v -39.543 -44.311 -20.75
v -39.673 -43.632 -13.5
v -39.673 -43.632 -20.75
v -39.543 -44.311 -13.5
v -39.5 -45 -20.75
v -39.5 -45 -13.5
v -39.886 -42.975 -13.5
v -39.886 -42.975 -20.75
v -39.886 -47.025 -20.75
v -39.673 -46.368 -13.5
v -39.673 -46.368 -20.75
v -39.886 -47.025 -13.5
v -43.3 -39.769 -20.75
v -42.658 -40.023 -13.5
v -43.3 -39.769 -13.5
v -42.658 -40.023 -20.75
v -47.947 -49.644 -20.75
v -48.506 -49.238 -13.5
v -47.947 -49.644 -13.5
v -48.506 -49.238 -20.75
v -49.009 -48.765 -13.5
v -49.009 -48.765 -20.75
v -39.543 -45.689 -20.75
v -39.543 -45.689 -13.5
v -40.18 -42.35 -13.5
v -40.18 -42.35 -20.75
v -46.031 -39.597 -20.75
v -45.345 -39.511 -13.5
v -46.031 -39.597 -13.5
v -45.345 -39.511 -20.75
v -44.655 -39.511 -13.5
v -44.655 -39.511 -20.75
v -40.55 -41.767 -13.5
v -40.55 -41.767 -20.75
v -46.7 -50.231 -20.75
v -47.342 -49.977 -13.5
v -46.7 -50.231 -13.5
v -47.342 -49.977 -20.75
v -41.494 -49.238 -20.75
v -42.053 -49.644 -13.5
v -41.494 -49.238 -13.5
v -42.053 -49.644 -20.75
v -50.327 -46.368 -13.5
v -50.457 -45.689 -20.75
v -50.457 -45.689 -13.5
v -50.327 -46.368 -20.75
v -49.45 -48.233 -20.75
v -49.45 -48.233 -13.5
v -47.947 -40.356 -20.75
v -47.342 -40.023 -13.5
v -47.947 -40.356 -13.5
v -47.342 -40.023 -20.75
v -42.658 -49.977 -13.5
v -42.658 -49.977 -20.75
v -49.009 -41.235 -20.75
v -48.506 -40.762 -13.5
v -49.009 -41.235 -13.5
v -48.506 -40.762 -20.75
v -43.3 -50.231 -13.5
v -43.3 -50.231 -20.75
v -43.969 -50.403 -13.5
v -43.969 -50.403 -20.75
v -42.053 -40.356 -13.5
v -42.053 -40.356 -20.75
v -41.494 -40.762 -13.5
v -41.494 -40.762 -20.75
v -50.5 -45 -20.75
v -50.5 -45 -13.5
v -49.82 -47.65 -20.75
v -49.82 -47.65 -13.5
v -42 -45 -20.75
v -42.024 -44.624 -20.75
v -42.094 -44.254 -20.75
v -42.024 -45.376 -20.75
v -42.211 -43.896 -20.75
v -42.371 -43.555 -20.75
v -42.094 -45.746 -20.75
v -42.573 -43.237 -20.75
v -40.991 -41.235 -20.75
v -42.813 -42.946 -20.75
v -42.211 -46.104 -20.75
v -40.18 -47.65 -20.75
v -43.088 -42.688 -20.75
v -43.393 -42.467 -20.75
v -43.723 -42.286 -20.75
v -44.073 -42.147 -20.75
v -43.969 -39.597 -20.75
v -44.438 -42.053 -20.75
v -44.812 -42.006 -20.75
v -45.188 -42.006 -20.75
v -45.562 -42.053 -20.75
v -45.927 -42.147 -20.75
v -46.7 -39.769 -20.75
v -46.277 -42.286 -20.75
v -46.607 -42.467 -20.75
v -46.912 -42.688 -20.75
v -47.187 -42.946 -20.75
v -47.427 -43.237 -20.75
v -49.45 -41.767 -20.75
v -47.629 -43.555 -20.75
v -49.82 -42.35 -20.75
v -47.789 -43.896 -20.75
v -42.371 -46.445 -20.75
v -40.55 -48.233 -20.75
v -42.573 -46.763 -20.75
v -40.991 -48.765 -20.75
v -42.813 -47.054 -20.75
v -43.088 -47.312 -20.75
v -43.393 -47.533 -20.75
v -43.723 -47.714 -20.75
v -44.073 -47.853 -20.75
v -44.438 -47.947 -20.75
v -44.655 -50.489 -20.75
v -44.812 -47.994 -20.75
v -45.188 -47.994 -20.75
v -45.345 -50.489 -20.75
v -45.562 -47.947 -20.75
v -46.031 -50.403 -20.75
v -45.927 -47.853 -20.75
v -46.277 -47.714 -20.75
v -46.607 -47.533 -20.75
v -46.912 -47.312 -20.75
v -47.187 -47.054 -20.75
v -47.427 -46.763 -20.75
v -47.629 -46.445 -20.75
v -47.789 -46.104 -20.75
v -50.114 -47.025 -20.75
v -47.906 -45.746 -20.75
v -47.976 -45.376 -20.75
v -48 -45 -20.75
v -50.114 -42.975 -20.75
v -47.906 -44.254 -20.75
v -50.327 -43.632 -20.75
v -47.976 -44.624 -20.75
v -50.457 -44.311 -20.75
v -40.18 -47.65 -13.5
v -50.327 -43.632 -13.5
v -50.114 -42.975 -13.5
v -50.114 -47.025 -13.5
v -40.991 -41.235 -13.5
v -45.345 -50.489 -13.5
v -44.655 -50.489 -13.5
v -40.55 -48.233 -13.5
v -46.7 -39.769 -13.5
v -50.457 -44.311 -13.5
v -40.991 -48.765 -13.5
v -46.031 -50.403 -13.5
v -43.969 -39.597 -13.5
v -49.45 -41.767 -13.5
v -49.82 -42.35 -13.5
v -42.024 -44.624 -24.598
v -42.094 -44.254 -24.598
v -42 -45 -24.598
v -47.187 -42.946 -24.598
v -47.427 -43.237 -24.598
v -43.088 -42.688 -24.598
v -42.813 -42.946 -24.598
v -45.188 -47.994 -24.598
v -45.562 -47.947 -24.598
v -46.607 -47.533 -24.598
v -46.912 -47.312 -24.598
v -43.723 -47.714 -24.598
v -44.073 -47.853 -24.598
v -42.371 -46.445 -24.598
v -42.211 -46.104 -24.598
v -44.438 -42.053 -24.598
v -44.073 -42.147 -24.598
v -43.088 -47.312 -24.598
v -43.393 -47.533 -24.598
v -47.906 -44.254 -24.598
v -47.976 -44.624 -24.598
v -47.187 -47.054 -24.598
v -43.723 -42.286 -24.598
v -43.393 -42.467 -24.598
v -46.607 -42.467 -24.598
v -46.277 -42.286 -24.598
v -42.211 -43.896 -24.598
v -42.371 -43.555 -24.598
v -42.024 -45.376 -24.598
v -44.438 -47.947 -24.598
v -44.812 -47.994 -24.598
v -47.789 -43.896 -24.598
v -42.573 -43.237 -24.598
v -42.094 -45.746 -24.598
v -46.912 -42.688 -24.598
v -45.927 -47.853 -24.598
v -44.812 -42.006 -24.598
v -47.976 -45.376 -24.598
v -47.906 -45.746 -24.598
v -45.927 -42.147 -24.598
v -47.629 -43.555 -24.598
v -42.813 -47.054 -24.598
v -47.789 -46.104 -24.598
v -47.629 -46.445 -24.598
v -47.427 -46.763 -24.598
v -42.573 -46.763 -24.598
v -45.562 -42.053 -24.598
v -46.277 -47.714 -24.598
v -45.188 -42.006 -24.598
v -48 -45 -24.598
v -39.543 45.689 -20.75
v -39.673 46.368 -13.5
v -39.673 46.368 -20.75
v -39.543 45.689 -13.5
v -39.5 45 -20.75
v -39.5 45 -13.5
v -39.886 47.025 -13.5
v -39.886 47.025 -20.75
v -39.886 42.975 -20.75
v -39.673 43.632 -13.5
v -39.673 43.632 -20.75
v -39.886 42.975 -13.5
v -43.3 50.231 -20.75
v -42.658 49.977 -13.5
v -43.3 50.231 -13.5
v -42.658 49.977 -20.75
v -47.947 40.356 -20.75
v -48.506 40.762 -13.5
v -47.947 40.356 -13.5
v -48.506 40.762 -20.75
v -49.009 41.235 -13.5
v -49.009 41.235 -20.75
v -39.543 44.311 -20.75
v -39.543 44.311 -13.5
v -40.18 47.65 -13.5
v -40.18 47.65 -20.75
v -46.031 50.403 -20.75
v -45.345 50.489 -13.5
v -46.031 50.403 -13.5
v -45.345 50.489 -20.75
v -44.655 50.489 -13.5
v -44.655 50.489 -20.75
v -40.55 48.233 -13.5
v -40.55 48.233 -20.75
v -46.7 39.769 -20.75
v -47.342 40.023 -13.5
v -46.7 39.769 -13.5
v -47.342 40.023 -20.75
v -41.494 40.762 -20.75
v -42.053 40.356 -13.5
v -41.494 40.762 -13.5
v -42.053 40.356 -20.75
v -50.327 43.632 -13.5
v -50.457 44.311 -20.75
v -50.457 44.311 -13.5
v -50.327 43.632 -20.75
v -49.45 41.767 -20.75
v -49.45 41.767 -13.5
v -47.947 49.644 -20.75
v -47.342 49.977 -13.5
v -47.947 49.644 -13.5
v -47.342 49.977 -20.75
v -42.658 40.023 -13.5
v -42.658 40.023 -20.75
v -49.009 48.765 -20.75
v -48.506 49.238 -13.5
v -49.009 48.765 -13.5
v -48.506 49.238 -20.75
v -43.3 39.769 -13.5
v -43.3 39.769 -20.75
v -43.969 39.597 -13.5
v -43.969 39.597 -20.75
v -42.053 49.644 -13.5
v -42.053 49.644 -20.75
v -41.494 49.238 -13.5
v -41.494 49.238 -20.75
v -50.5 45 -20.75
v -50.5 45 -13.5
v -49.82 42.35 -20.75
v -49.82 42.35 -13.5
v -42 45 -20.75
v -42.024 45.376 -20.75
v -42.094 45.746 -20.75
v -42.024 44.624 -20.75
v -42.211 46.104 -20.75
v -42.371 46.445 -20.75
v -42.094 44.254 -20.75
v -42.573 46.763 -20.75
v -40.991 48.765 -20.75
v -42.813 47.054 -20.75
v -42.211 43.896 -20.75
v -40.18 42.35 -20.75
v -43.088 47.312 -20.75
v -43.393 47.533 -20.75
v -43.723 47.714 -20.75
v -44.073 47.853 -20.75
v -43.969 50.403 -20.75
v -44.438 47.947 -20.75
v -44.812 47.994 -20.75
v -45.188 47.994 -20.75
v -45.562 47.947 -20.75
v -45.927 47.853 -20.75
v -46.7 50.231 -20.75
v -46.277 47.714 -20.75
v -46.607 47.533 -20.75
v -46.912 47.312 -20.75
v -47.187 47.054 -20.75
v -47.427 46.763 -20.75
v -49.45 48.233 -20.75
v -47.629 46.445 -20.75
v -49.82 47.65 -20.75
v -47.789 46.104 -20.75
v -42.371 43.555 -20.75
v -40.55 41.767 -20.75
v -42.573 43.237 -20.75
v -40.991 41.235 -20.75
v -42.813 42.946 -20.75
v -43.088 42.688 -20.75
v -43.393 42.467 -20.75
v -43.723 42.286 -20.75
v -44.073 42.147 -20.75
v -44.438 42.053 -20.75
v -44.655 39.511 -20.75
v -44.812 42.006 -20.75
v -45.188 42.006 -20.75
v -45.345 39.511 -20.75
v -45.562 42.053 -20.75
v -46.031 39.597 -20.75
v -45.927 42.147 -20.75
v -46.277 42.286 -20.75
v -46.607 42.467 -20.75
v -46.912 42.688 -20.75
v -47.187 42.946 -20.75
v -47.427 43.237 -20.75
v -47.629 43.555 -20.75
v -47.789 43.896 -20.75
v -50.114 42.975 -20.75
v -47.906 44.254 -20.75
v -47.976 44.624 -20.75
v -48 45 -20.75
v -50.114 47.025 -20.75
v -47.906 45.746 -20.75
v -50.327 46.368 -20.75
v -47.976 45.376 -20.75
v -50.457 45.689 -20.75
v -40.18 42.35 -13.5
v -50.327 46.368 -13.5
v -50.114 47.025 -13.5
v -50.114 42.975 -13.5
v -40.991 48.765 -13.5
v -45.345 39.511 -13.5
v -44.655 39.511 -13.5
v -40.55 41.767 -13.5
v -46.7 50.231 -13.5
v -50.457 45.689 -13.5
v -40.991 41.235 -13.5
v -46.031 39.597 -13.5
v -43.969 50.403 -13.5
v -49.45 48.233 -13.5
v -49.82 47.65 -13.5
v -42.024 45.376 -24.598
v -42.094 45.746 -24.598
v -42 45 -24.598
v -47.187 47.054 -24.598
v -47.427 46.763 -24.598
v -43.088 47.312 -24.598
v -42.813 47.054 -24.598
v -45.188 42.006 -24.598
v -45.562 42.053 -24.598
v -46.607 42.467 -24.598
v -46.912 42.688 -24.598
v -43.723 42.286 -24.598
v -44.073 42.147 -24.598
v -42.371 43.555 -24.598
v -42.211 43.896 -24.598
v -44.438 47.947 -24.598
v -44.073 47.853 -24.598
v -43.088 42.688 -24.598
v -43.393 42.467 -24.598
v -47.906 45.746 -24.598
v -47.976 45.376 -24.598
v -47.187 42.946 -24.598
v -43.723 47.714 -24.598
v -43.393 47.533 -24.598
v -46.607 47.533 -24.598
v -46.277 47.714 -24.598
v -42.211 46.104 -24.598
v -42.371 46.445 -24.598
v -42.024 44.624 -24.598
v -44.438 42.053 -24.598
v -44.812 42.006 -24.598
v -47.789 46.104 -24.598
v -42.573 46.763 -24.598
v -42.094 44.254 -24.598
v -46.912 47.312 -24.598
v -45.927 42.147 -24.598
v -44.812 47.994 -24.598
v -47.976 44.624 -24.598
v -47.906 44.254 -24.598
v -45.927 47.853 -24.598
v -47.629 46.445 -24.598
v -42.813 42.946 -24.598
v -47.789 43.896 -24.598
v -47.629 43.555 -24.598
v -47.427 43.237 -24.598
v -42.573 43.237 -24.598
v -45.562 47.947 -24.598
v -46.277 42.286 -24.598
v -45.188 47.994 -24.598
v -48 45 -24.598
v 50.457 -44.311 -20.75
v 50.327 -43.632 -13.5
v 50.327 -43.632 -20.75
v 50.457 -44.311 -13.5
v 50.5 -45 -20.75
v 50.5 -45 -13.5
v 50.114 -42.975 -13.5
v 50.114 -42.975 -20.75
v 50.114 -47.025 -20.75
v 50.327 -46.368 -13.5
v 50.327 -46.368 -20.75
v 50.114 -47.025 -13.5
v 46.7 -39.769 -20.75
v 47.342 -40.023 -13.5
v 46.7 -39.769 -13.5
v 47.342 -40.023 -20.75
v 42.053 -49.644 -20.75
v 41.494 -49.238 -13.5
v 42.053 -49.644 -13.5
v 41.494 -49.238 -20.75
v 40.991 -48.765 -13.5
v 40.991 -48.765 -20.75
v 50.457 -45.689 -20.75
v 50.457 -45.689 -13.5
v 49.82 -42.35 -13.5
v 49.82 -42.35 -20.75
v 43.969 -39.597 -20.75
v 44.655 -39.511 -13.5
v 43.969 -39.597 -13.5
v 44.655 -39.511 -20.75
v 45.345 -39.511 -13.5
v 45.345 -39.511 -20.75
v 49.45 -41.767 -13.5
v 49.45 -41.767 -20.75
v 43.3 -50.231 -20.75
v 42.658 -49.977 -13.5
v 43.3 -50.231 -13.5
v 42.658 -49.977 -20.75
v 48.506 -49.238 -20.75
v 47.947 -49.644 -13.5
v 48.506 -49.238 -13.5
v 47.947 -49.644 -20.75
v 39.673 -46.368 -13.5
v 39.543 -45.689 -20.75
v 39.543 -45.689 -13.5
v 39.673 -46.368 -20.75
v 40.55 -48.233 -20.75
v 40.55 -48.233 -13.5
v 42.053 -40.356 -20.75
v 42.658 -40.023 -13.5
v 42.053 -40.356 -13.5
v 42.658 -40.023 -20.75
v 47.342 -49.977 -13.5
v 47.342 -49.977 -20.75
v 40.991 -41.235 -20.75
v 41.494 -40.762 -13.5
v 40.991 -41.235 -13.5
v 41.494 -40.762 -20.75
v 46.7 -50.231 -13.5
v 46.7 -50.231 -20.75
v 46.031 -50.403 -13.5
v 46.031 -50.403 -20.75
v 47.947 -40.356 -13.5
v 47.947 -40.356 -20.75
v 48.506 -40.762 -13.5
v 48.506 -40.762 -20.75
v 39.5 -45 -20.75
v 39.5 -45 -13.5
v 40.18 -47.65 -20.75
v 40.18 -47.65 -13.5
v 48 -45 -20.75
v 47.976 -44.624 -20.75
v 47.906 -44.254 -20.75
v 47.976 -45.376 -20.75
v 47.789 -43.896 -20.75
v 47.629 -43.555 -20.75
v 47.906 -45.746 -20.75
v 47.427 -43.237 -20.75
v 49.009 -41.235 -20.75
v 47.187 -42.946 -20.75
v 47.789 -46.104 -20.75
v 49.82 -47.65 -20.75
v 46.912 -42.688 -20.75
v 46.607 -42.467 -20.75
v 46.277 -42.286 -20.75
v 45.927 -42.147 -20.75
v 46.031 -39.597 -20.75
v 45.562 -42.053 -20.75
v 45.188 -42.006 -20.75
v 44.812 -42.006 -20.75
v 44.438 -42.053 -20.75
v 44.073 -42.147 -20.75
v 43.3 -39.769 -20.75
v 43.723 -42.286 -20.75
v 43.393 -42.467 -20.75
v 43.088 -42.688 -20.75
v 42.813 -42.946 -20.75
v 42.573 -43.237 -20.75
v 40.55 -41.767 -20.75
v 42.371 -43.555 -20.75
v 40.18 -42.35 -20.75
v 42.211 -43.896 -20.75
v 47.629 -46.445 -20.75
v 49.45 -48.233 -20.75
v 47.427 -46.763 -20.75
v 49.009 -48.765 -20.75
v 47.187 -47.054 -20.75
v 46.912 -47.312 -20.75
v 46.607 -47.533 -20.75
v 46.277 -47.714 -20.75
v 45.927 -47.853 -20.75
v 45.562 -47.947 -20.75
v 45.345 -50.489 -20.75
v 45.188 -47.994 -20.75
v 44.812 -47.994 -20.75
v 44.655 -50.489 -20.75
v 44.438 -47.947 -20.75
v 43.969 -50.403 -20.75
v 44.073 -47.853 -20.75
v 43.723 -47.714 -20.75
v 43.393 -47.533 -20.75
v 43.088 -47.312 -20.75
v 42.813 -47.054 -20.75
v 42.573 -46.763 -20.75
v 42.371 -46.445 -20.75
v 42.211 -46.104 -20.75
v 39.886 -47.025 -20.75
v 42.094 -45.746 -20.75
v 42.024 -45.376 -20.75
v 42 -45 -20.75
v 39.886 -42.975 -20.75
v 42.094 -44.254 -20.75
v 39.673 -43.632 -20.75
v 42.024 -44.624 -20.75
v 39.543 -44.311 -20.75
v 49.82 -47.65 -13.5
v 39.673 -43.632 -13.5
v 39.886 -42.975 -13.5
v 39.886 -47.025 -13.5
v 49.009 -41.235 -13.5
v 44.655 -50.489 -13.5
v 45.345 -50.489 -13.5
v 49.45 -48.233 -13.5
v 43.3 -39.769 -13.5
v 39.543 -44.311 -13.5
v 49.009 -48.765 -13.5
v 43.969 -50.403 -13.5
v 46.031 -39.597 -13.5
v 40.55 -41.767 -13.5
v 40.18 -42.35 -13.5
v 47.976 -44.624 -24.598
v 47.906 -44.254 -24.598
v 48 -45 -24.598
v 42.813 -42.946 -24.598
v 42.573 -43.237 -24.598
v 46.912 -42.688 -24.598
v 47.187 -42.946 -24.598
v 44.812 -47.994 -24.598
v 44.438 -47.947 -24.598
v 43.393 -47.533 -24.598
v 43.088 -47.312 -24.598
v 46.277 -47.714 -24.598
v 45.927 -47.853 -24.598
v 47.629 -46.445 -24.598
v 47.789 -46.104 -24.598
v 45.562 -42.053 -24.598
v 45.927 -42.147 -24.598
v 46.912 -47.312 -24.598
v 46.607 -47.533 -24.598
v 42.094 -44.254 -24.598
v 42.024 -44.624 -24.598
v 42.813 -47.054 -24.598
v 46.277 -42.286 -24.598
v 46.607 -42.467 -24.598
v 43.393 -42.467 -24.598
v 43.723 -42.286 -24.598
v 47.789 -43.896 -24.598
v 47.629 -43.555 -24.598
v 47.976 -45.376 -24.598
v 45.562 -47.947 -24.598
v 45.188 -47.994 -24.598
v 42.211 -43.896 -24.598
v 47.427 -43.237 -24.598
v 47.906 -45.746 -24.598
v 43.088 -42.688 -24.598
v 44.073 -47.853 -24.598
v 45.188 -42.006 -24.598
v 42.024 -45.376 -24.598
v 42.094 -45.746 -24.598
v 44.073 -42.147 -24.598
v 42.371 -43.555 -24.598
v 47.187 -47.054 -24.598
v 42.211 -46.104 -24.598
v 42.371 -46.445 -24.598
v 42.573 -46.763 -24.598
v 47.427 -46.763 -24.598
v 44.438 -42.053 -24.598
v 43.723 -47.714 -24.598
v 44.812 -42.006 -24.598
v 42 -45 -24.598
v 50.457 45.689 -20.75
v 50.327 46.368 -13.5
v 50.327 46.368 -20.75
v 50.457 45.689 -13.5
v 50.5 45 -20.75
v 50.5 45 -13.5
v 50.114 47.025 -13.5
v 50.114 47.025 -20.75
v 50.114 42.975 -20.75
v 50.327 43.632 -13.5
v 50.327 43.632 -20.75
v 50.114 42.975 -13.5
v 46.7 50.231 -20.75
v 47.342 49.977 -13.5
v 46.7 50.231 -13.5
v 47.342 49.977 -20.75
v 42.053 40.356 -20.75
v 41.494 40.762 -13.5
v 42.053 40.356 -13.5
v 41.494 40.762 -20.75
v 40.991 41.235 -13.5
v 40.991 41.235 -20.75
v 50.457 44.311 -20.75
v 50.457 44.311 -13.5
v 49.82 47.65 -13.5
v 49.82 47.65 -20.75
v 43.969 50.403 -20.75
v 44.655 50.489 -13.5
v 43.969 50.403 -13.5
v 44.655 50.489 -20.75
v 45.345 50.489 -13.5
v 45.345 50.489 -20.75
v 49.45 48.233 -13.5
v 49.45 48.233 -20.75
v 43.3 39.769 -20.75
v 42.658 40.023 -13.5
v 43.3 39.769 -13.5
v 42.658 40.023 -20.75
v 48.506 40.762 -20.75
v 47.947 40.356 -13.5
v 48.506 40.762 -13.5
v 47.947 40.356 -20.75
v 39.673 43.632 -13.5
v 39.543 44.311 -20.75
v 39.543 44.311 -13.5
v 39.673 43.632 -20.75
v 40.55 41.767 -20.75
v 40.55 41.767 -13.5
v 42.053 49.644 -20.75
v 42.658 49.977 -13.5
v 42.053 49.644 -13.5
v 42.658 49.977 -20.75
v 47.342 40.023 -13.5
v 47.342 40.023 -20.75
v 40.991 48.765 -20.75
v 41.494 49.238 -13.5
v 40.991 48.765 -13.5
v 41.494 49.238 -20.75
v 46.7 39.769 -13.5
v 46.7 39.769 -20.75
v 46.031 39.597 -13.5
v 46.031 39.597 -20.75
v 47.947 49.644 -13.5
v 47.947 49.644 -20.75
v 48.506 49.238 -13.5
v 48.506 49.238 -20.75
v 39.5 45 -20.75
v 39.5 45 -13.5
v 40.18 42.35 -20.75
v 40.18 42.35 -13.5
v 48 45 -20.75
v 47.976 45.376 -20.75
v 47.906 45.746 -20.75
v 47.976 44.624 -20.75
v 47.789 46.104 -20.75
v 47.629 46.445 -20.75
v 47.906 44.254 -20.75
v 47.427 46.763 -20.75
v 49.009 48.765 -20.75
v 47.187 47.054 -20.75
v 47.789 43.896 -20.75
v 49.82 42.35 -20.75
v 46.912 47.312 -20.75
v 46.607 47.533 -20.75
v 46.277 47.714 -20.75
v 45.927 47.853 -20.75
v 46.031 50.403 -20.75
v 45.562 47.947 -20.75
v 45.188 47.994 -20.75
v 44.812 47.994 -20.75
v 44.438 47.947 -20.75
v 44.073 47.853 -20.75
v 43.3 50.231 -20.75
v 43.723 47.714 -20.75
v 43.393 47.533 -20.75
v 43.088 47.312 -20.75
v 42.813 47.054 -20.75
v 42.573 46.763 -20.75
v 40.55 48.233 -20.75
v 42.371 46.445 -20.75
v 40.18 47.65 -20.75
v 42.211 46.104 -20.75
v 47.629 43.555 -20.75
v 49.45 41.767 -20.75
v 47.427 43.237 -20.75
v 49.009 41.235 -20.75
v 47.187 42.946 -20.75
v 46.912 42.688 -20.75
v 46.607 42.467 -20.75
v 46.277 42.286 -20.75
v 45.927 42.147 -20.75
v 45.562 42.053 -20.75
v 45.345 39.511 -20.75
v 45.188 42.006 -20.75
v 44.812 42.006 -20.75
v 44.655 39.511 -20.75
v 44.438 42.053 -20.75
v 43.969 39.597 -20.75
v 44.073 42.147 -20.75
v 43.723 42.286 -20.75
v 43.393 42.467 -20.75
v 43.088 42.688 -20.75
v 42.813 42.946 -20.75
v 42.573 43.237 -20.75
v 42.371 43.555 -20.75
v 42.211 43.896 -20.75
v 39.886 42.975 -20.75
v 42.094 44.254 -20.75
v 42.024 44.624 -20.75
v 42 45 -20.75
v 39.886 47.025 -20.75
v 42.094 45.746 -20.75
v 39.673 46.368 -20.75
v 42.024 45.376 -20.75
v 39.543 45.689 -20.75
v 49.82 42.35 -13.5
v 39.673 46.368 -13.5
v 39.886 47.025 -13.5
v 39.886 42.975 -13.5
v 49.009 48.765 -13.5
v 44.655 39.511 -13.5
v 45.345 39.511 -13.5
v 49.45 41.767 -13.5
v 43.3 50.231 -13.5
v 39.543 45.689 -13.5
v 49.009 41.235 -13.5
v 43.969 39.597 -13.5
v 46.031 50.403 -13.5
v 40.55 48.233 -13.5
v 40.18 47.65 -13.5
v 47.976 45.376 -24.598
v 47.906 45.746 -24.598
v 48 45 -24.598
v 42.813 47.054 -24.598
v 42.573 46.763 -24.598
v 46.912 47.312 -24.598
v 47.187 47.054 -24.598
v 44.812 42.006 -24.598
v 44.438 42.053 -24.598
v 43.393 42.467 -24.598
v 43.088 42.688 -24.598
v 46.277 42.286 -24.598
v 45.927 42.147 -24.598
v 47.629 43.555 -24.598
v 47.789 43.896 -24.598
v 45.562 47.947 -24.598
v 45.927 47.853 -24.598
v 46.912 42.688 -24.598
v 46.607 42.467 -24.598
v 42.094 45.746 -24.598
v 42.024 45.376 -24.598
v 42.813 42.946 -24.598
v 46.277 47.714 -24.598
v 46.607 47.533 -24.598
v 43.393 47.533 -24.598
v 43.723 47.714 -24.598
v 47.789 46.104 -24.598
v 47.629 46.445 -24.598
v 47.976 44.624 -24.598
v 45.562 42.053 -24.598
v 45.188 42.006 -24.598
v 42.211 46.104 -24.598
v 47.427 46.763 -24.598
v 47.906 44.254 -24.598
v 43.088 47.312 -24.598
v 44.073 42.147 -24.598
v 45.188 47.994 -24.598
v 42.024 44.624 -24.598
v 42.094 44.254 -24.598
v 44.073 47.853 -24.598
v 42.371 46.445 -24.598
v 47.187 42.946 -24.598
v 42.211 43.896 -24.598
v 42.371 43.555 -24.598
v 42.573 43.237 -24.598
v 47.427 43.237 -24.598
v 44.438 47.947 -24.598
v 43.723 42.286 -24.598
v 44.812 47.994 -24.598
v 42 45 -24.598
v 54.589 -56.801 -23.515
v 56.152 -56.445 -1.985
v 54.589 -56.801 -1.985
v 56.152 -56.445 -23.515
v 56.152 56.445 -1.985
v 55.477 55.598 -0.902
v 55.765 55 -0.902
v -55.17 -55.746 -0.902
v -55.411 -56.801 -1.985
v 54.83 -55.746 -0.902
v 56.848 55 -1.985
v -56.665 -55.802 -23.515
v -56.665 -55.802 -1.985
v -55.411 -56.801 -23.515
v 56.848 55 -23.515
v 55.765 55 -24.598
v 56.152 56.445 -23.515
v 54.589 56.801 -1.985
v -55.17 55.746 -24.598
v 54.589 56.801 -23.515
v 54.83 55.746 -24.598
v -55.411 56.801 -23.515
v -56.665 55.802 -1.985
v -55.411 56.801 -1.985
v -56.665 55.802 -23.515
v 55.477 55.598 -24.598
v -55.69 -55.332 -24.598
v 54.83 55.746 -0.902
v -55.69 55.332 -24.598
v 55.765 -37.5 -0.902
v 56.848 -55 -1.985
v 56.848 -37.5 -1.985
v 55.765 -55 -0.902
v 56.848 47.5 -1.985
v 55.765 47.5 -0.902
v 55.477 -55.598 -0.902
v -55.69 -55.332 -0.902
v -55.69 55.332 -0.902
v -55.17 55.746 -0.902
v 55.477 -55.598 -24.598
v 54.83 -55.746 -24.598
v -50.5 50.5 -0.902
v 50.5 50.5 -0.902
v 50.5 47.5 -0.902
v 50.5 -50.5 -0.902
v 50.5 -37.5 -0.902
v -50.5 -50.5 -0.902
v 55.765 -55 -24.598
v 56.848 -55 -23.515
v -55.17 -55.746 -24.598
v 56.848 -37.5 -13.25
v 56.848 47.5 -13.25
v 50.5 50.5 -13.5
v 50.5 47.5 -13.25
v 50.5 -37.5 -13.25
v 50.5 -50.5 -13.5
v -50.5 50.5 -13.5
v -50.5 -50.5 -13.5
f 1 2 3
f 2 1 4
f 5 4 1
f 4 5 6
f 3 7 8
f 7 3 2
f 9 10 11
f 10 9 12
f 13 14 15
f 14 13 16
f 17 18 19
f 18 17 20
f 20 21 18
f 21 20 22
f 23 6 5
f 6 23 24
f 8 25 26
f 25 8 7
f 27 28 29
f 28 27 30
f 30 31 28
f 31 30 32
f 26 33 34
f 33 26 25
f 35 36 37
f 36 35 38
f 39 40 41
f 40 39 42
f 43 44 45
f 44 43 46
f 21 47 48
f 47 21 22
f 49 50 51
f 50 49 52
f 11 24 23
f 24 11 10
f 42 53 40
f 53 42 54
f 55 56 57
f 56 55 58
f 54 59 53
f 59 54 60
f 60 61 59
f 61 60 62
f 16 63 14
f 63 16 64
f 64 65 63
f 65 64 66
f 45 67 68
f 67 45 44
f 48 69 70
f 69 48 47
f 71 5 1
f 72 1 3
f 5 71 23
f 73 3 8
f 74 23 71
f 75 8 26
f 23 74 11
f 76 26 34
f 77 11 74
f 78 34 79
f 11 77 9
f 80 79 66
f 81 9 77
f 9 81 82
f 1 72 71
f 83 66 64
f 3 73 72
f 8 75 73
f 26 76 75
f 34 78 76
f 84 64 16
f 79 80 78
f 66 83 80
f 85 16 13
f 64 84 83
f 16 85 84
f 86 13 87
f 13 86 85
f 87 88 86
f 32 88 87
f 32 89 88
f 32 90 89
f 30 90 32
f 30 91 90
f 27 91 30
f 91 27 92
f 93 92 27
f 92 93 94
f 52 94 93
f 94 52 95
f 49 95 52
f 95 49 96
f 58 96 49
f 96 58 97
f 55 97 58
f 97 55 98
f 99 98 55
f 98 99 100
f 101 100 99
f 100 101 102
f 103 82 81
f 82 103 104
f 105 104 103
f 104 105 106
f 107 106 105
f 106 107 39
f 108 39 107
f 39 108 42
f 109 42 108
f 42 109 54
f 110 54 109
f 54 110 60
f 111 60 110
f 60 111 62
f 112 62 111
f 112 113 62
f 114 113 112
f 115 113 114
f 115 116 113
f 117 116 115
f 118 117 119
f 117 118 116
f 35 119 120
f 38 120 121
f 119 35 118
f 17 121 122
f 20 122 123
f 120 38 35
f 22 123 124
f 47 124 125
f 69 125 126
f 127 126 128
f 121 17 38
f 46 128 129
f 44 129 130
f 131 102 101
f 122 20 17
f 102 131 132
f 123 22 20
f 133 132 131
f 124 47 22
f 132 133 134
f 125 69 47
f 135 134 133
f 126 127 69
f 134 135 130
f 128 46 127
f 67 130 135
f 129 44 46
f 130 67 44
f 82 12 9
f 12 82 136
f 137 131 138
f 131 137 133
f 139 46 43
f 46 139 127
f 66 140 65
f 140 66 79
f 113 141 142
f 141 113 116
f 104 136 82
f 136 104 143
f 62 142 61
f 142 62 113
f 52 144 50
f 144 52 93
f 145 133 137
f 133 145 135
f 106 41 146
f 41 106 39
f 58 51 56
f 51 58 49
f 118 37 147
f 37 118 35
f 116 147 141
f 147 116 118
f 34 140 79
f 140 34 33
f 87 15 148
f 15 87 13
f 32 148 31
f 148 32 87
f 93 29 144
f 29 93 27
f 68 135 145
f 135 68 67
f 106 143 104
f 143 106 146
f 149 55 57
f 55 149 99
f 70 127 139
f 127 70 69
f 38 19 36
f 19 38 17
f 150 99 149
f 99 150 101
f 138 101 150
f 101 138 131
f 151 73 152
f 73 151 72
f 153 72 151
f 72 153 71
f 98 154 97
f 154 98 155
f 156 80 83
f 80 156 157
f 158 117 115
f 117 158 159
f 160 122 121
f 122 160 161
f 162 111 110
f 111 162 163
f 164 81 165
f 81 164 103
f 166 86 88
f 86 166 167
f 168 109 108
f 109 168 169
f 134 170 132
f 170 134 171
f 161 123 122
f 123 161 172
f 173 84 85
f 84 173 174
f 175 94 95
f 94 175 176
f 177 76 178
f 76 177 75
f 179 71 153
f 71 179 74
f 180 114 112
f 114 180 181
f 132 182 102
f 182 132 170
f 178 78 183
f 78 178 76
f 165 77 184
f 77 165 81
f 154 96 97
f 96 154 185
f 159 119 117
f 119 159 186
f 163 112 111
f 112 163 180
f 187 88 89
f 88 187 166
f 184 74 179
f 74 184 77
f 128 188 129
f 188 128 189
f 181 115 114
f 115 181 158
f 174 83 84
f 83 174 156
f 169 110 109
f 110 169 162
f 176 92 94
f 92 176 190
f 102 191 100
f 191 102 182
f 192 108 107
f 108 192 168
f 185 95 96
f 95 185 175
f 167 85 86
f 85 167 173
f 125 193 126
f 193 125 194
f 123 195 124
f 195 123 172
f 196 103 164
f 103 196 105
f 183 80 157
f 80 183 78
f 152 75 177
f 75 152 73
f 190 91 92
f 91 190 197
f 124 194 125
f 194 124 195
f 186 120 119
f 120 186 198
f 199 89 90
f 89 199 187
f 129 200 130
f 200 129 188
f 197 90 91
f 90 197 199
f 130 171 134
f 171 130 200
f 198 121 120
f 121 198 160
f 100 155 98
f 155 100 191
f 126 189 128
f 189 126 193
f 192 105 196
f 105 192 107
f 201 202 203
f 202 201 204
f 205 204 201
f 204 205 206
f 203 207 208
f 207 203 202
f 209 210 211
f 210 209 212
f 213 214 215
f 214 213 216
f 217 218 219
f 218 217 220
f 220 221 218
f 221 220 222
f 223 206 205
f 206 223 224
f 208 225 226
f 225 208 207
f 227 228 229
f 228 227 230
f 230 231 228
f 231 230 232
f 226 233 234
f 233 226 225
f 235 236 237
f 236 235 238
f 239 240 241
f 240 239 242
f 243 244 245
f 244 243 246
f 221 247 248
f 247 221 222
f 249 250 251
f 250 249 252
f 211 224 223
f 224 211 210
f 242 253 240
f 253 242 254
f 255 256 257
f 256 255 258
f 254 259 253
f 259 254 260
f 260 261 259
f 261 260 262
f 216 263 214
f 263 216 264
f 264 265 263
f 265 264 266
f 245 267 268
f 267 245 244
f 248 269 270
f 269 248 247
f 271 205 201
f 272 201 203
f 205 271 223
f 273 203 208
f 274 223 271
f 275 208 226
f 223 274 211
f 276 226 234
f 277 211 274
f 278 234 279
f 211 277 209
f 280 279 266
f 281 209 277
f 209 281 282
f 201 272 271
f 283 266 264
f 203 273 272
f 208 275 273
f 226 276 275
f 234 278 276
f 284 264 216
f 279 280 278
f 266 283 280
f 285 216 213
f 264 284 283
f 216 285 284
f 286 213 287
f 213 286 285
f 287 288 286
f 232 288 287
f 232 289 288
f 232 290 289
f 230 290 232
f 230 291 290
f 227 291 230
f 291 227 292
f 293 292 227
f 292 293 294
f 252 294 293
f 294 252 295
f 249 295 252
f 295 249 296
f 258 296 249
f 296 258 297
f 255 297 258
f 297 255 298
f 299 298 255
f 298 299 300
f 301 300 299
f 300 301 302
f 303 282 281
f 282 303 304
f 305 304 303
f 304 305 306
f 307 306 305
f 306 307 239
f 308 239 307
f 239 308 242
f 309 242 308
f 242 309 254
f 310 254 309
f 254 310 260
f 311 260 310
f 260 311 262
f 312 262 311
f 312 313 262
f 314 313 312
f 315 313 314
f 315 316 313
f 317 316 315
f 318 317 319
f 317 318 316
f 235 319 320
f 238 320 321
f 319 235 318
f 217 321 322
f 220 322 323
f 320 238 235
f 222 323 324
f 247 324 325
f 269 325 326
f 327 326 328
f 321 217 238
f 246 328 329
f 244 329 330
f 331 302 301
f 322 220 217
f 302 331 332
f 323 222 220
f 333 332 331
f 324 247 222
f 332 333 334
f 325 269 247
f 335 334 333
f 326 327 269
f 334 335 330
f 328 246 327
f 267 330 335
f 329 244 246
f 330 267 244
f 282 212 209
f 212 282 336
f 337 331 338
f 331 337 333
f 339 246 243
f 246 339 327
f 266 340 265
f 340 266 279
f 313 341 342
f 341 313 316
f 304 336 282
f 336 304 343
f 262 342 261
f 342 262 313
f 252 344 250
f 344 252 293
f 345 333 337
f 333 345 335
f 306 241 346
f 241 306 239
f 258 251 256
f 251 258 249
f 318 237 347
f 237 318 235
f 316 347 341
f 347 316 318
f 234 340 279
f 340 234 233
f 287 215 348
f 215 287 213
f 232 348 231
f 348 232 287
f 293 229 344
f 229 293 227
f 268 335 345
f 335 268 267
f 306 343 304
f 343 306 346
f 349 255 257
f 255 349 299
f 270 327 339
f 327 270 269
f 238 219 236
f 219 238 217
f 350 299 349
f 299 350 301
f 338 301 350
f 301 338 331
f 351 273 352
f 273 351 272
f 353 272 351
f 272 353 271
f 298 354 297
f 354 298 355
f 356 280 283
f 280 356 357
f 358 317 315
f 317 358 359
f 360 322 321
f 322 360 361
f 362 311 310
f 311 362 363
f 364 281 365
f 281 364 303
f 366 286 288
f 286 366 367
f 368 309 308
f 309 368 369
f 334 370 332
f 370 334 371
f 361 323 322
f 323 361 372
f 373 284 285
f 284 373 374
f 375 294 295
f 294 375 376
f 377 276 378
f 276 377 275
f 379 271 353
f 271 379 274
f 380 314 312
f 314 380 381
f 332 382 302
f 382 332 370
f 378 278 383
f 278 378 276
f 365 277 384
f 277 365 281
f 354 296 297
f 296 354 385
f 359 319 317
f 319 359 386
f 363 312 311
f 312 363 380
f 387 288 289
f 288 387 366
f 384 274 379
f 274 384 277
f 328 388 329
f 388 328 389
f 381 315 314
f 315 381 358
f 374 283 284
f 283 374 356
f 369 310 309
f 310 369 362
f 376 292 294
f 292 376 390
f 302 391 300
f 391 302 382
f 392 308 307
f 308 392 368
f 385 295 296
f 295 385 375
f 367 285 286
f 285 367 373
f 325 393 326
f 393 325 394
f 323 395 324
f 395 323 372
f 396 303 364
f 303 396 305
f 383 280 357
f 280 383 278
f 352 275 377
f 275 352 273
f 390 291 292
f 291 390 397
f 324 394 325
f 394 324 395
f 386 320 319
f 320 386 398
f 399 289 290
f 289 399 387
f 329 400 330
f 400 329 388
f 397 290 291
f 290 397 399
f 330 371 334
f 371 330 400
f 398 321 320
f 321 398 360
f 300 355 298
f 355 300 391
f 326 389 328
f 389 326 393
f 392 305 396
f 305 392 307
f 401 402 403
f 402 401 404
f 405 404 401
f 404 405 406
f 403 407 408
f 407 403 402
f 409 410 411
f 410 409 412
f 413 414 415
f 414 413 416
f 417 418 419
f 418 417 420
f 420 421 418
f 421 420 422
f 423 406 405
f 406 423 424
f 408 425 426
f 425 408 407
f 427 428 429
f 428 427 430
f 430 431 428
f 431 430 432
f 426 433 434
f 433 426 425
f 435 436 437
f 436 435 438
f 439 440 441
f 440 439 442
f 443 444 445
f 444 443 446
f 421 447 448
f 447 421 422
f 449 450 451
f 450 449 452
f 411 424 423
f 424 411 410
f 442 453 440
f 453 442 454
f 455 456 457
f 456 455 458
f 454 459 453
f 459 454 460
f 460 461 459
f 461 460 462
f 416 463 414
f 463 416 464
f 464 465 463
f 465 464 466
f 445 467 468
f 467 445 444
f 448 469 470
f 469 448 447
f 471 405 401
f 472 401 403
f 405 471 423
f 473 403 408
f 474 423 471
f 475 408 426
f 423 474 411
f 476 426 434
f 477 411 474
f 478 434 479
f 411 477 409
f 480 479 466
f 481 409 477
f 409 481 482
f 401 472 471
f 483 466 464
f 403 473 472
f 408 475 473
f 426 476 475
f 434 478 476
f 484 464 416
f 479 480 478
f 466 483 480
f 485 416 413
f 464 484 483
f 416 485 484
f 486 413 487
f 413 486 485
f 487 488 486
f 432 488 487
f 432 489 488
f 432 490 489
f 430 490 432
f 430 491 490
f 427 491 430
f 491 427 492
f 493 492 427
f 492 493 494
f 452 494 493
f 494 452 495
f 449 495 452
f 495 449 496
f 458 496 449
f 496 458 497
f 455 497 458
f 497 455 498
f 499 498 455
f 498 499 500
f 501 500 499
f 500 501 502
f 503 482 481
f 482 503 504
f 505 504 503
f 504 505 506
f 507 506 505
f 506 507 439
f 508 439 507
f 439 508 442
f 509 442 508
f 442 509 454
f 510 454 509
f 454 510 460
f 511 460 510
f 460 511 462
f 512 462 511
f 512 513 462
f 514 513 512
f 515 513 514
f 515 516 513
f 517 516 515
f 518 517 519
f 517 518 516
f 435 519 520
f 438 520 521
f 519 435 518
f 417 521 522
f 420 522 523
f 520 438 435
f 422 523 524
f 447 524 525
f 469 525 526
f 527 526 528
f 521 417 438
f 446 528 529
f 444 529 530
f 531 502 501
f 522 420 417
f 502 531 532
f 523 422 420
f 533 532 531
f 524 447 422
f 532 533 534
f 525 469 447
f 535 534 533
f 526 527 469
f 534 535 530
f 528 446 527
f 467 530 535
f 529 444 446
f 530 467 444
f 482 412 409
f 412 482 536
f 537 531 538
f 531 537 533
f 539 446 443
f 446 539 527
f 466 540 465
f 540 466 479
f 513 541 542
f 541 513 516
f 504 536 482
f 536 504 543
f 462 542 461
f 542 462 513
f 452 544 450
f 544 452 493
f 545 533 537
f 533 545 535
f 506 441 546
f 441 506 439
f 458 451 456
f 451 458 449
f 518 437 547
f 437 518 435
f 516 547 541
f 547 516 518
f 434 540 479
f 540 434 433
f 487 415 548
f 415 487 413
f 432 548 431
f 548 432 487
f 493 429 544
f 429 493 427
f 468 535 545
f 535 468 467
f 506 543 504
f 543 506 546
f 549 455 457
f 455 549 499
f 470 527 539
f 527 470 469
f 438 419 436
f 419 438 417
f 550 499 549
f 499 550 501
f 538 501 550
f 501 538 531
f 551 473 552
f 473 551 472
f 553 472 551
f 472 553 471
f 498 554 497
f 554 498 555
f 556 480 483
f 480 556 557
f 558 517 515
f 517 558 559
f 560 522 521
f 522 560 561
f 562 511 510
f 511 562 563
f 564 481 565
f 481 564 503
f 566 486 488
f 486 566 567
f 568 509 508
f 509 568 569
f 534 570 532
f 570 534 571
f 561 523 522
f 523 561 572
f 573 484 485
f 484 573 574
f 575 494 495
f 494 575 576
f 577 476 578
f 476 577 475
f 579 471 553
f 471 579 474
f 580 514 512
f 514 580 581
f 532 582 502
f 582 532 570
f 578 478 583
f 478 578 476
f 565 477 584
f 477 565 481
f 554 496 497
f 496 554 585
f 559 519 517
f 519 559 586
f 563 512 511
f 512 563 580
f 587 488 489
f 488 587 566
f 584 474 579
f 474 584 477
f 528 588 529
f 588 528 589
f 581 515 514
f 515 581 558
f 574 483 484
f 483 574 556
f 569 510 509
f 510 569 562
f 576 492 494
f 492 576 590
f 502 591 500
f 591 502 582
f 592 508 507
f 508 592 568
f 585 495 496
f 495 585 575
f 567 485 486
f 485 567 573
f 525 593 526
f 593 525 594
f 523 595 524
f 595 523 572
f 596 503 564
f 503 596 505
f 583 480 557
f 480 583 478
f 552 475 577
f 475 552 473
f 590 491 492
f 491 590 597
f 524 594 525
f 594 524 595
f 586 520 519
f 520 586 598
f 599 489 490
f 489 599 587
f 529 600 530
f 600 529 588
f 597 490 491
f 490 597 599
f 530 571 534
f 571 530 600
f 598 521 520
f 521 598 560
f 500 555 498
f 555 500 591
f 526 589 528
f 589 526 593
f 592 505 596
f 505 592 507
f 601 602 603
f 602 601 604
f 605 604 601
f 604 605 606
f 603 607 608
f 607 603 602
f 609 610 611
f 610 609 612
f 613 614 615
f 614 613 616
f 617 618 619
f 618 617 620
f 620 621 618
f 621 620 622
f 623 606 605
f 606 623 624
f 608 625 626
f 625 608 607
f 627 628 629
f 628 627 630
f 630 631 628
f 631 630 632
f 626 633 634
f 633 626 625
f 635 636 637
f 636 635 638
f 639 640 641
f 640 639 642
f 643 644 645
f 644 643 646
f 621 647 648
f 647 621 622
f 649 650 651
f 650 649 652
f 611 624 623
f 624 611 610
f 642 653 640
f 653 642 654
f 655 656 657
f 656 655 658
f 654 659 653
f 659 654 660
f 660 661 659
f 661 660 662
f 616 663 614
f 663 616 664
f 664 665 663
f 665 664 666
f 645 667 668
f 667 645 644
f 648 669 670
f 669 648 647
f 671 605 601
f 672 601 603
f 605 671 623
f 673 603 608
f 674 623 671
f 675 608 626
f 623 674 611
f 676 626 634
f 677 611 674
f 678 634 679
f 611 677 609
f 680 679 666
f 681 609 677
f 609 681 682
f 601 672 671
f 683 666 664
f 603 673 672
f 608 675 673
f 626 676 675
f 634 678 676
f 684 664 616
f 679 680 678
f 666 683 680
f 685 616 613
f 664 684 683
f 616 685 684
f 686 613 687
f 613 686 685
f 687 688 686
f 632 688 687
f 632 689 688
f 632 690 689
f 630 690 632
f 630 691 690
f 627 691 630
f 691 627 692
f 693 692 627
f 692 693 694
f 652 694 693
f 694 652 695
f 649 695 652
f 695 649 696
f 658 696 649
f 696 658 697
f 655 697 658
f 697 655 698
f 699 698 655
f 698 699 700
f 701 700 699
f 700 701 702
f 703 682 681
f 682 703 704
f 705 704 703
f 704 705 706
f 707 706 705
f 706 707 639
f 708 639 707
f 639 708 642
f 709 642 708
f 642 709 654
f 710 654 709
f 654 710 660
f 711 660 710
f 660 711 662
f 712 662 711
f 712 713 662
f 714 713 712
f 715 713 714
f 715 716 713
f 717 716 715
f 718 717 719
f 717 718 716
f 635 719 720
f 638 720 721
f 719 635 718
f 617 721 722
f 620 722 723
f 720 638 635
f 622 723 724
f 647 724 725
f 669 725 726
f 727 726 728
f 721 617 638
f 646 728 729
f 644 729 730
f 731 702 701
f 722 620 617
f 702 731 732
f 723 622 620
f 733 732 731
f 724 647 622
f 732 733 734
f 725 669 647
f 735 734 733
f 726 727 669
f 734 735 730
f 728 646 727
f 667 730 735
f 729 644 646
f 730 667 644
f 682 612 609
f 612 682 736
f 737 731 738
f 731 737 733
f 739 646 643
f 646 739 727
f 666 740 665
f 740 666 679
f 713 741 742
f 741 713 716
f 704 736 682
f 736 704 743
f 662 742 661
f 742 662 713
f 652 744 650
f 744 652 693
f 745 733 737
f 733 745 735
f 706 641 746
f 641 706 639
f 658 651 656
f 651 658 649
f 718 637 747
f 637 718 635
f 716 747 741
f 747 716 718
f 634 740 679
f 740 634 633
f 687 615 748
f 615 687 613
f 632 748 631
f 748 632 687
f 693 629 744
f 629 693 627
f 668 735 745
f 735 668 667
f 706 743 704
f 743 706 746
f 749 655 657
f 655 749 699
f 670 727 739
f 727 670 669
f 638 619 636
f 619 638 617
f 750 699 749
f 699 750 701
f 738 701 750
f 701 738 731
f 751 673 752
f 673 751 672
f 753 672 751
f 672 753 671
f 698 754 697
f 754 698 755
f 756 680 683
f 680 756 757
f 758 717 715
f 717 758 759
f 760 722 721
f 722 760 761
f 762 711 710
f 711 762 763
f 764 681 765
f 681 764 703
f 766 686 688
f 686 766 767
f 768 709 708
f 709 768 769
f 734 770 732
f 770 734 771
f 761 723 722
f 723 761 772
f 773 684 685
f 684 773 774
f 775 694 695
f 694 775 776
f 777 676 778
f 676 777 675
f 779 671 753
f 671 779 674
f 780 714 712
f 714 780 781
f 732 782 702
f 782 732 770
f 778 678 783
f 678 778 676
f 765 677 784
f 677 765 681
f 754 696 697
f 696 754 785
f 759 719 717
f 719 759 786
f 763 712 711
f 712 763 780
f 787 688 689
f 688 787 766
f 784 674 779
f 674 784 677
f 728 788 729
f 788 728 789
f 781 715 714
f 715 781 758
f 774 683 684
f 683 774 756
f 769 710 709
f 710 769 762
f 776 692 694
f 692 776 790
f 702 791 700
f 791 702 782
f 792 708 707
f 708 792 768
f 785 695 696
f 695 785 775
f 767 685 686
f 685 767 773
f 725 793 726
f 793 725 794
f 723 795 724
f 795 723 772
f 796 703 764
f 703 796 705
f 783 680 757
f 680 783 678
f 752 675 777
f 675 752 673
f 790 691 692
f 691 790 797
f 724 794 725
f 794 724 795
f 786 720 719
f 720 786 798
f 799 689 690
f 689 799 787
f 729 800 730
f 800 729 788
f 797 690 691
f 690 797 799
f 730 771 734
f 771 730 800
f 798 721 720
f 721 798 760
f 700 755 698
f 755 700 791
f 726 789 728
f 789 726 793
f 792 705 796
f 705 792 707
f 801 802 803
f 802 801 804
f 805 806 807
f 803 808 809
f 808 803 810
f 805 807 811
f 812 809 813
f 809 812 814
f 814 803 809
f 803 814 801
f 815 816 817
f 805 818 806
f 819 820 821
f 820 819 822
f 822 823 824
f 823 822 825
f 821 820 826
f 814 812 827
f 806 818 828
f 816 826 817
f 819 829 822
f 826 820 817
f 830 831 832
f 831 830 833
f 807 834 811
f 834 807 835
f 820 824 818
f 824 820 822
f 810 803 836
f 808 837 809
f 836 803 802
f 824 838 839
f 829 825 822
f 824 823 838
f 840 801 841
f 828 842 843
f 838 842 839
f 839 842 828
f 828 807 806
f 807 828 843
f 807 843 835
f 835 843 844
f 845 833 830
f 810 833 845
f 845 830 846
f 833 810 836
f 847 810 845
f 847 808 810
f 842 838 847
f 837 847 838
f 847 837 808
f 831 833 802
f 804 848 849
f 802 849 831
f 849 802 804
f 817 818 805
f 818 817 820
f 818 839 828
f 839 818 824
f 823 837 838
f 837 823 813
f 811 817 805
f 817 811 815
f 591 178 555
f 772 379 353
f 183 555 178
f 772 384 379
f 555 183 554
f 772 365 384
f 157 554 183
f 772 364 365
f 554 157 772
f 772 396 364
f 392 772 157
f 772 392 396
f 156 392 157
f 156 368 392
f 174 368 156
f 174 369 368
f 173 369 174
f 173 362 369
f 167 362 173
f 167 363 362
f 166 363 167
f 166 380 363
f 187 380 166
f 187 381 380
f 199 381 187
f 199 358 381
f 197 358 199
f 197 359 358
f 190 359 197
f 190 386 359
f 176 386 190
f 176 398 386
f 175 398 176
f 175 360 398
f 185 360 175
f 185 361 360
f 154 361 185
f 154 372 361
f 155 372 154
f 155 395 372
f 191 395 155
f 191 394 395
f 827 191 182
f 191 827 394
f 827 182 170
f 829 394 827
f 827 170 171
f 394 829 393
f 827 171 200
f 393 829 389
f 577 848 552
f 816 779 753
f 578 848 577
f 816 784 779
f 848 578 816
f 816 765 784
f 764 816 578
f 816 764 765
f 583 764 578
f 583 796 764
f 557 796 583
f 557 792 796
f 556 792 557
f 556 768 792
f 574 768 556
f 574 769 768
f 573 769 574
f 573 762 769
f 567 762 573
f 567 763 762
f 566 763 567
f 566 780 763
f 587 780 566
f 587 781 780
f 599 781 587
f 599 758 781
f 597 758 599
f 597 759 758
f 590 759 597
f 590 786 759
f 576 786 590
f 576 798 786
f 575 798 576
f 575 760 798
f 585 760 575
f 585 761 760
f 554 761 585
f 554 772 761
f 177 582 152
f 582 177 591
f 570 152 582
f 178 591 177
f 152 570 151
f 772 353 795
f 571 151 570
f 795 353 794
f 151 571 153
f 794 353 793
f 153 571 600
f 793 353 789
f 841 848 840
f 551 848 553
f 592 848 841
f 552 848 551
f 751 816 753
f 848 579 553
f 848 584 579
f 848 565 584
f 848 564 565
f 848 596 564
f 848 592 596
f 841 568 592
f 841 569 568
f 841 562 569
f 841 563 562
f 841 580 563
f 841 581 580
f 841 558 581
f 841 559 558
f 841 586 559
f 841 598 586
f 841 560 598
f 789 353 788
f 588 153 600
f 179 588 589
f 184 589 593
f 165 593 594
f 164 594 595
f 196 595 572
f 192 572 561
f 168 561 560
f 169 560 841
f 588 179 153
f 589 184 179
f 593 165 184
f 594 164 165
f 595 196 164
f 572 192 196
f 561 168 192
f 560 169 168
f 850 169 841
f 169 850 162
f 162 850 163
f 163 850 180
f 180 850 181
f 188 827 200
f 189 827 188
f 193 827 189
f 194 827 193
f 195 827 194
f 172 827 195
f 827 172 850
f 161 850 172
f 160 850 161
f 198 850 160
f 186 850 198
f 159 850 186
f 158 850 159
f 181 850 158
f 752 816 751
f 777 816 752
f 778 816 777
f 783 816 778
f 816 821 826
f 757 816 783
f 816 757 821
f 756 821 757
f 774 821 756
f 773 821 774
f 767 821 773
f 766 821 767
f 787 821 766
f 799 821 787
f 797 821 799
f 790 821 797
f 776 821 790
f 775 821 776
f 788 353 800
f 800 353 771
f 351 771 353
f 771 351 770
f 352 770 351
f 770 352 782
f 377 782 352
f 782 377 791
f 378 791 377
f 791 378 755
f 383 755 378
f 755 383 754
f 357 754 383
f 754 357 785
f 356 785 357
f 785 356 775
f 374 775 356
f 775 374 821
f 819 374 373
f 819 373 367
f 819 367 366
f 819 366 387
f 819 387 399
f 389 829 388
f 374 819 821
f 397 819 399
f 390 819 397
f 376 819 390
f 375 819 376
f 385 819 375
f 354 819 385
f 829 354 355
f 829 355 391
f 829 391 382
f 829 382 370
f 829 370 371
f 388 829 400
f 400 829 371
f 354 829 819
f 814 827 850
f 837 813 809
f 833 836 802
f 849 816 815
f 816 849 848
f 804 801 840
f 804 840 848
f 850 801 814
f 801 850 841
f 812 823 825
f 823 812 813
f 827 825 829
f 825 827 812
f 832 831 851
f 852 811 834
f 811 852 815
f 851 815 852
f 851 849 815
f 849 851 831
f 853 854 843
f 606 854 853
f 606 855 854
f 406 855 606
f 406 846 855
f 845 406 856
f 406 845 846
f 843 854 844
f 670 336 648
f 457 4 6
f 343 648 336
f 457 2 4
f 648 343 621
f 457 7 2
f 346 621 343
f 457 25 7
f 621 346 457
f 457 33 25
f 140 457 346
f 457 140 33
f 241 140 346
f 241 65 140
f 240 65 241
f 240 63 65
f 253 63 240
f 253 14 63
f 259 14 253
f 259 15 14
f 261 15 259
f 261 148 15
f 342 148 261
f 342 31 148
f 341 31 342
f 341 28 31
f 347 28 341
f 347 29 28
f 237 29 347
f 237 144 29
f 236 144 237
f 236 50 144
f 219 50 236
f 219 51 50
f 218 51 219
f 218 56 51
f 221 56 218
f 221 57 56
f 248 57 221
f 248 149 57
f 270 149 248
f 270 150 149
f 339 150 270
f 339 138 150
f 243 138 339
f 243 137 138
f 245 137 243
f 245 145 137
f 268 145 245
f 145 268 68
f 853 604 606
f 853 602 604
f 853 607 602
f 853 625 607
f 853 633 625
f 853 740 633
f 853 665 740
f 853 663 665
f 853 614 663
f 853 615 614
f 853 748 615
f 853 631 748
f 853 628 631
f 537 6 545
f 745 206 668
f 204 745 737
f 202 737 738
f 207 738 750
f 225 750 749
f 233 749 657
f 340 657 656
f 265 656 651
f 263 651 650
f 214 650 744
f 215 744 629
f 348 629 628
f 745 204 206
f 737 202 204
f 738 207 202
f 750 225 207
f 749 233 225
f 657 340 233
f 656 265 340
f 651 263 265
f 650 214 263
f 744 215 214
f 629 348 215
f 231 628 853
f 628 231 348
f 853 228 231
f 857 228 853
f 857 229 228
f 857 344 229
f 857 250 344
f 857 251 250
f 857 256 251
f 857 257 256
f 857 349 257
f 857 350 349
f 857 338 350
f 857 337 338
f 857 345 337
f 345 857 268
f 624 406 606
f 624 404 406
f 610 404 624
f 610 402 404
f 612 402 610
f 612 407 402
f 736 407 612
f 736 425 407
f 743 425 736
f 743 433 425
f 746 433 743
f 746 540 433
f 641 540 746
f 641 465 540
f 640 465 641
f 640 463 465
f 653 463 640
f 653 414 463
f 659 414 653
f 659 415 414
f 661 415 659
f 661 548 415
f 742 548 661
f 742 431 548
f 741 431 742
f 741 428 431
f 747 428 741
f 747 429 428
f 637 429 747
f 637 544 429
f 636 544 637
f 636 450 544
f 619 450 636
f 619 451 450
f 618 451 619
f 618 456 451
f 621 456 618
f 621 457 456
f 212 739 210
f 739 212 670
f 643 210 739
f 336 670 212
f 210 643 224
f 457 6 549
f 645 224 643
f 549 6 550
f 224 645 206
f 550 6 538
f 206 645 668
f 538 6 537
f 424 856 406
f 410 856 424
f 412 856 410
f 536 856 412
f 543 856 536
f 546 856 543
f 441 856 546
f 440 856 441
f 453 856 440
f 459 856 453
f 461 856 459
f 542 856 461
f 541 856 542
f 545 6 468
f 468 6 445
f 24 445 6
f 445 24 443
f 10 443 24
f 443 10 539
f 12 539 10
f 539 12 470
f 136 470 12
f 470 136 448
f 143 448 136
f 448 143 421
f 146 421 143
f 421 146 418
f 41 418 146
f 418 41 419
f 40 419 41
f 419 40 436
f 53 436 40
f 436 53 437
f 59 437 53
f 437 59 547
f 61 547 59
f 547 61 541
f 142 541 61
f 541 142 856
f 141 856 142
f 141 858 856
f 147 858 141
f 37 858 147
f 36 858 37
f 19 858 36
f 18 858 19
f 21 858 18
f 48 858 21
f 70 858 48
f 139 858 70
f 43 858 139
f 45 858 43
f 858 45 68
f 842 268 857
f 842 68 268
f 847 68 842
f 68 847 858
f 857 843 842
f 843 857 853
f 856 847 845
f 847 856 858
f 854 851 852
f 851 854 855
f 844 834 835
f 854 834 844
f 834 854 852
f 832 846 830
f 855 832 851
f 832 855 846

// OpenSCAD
//Tenda Gehäuse

Hohe = 40;
Breite = 110;
Tiefe = 110;

Tenda = false;
Oben = false;
Unten = true;

module Loch1() {
    $fn=50;
    cylinder(d=11.0,h=8,center=true);
    cylinder(d=6,h=22,center=true);  
}

module Loch2() {
    $fn=50;
    cylinder(d=6.0,h=8,center=true);
    cylinder(d=4,h=52,center=true);  
}


module Tenda() {
    color ("red")
    cube([101,101,27],center=true);
    
}


if (Tenda) Tenda();


module Unten() {
    translate([0,0,-27/4])
    difference() {
    
        translate([0,0,-6])
        minkowski()
        {
          cube([Breite,Tiefe,Hohe/2], center=true);
          sphere(r=2);
            
        }
        
        translate([0,0,27/4])
        Tenda();
        translate([-45,-45,-10]) Loch1();
        translate([-45, 45,-10]) Loch1();
        translate([ 45,-45,-10]) Loch1();
        translate([ 45, 45,-10]) Loch1();
        
        translate([30,5,11])
        cube([80,85,35], center=true);
    }
}



module Oben() {
    translate([0,0,27/4])
    difference() {
    
        translate([0,0,2])
        minkowski()
        {
          cube([Breite,Tiefe,Hohe/2],center=true);
          sphere(r=2);
            
        }
        
        translate([0,0,-27/4])
        Tenda();
        translate([-53,-53,10]) Loch2();
        translate([-53, 53,10]) Loch2();
        translate([ 53,-53,10]) Loch2();
        translate([ 53, 53,10]) Loch2();
        
        translate([30,5,-3])
        cube([80,85,27/2], center=true);
    }


} 

if (Oben) Oben();
if (Unten) Unten();
